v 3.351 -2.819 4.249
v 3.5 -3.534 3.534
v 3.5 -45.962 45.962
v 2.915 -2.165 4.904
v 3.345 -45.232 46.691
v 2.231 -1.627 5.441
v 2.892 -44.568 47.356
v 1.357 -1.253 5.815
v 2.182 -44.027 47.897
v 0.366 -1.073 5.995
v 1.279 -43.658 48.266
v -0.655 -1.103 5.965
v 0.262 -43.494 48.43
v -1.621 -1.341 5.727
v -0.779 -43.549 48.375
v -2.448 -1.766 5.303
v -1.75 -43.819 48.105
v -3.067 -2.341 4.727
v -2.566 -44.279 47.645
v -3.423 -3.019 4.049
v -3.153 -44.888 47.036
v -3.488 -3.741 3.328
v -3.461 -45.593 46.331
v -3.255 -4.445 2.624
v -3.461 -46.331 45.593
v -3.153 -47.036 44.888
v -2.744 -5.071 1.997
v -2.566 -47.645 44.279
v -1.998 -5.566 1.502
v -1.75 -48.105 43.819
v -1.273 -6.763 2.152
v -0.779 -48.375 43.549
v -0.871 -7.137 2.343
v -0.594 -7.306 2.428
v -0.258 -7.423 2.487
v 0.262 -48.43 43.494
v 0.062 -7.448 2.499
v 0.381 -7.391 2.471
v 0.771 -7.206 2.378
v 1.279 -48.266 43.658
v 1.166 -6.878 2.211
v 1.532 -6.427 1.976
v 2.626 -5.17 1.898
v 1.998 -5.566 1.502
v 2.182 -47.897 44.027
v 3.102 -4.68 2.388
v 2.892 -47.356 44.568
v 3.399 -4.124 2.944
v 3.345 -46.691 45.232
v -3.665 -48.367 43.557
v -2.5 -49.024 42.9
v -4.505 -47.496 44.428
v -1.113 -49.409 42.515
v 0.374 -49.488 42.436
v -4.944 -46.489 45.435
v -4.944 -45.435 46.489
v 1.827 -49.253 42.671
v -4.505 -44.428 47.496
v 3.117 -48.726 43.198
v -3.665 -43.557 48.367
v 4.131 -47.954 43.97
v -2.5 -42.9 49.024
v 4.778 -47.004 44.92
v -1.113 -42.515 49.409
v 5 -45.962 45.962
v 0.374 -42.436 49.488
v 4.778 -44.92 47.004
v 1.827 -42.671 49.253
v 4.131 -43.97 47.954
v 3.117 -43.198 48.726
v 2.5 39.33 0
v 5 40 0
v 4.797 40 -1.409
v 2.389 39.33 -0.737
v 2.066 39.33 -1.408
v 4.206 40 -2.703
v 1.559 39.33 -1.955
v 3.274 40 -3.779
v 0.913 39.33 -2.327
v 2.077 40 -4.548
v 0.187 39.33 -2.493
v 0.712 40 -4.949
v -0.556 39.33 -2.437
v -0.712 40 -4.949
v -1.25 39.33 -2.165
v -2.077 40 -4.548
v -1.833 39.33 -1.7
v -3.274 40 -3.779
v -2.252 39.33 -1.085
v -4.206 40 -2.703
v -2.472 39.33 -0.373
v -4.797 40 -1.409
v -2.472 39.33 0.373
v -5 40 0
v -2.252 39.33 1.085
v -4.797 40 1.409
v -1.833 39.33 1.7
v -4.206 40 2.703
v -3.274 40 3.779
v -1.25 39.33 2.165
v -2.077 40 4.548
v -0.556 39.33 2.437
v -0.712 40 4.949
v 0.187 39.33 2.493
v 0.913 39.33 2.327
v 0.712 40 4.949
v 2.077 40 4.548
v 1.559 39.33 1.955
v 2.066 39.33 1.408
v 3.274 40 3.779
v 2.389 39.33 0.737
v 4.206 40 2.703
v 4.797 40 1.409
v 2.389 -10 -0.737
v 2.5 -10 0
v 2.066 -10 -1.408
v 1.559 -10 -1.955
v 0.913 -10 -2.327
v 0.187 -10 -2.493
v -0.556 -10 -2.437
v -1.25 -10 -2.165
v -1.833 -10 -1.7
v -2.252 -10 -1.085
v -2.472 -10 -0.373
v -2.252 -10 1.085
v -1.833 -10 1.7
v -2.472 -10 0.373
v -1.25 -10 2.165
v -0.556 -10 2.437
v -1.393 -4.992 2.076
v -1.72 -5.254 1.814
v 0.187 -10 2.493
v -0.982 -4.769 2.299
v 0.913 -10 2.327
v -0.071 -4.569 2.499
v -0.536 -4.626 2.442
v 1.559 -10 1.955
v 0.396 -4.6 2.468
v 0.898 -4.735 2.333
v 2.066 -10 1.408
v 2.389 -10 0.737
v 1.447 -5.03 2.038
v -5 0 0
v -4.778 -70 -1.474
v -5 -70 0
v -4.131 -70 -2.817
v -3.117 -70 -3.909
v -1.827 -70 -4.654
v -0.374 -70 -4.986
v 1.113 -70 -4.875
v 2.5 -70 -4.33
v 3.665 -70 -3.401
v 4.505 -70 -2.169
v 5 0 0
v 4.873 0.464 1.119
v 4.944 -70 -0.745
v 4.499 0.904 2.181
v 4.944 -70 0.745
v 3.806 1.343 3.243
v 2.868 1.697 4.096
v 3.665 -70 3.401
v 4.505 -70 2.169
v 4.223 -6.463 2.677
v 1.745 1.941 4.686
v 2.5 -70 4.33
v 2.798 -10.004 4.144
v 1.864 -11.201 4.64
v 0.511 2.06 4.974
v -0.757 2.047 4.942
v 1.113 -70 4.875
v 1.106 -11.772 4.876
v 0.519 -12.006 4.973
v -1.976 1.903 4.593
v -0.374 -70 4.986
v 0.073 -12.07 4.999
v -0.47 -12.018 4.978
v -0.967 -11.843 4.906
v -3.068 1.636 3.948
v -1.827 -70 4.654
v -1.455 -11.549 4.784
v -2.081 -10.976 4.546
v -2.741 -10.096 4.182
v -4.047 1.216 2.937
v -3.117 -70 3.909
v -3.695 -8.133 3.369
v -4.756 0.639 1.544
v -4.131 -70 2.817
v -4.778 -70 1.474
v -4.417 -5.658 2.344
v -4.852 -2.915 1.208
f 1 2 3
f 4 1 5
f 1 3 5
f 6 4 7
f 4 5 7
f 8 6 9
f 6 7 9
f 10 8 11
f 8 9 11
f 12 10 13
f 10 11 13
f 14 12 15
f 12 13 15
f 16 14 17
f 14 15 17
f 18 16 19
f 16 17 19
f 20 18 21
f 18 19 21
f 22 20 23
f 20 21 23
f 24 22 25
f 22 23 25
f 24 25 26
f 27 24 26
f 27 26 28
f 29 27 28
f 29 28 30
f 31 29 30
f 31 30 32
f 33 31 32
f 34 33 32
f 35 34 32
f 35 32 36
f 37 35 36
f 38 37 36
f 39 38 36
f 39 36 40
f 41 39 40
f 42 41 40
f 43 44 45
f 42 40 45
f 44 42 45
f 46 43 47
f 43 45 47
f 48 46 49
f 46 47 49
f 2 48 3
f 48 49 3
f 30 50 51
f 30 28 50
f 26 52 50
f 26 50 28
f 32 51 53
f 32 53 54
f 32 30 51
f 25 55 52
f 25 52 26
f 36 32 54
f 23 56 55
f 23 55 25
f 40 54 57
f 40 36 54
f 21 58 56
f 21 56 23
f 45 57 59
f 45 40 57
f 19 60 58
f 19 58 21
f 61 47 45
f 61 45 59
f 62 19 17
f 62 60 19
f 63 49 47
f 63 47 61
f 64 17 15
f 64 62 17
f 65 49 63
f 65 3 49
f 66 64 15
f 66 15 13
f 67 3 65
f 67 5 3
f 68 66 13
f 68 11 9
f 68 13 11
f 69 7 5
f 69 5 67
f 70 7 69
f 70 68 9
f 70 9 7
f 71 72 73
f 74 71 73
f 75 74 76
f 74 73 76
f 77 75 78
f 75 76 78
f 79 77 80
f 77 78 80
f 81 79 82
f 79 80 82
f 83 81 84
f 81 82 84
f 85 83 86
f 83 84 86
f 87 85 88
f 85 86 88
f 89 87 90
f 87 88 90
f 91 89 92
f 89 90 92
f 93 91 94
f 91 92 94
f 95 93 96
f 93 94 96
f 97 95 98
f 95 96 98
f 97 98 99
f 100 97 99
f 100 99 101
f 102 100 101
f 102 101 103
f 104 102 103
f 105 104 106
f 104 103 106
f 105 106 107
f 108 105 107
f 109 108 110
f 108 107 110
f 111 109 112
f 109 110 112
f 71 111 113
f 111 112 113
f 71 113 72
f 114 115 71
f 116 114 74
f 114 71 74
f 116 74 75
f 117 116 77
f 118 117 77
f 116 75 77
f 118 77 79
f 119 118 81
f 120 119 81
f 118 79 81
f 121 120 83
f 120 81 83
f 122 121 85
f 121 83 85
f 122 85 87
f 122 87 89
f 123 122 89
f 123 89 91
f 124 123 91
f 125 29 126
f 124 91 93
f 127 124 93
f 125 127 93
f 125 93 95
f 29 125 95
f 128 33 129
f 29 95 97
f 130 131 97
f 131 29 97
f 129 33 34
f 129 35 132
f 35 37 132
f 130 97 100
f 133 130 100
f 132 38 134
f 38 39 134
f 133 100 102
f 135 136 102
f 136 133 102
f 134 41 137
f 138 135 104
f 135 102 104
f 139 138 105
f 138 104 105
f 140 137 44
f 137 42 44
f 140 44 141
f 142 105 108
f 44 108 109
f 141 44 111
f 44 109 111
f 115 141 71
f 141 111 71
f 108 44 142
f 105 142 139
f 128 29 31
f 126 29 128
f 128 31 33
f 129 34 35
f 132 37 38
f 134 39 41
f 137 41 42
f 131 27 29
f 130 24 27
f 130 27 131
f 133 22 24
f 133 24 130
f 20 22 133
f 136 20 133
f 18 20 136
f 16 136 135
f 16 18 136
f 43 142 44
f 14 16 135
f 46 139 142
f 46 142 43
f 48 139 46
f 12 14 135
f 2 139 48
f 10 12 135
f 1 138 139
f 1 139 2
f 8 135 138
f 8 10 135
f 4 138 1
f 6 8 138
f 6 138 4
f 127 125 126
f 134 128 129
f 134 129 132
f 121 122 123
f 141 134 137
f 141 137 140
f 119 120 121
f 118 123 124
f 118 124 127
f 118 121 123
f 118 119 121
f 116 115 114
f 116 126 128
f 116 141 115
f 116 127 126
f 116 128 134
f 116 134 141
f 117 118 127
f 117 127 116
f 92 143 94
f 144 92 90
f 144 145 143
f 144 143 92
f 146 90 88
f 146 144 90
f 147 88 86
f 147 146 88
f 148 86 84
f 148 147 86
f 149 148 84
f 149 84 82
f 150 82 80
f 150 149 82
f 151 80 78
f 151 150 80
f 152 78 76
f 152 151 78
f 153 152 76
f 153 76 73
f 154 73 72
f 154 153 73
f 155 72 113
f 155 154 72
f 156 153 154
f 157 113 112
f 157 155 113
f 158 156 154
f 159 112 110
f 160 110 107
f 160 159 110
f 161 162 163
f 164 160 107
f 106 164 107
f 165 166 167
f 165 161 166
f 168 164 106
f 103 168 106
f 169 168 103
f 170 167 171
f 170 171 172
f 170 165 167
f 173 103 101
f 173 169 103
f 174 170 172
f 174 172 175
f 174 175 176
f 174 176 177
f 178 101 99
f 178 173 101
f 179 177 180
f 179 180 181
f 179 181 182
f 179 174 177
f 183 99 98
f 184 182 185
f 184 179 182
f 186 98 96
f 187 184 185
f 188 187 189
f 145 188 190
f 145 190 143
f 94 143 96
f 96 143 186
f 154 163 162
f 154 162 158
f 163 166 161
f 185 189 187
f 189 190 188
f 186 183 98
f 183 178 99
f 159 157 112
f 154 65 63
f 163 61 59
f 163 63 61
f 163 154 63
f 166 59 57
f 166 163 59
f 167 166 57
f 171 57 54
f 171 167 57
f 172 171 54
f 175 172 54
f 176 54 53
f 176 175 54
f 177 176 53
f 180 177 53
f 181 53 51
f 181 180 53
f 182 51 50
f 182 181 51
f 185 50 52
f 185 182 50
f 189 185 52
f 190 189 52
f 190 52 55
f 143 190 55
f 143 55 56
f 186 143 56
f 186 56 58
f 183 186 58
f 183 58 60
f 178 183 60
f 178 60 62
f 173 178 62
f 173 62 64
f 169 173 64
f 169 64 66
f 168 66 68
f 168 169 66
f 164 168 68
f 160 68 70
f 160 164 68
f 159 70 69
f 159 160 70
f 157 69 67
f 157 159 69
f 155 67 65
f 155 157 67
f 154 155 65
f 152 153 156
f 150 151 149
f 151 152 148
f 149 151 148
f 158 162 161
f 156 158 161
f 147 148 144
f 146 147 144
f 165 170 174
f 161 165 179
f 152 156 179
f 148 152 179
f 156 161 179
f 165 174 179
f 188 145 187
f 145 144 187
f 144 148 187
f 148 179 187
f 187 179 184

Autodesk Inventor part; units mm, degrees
ref_plane "YZ Plane" through (0, 0, 0) normal (1, 0, 0) x (0, 1, 0)
ref_plane "XZ Plane" through (0, 0, 0) normal (0, 1, 0) x (-1, 0, 0)
ref_plane "XY Plane" through (0, 0, 0) normal (0, 0, 1) x (1, 0, 0)
ref_plane "Płaszczyzna konstrukcyjna9" through (0, 0, 0) normal (0, -0.7071068, 0.7071068) x (1, 0, 0)
sketch "Szkic5" plane through (0, 0, 0) normal (0, -0.7071068, 0.7071068) x (1, 0, 0)
  circle A0 centre (0, 0) radius 5
  dimension "d1" = 10
extrude "Wyciągnięcie proste1" add sketch "Szkic5" along normal blind 65
sketch "Szkic6" plane through (0, 0, 0) normal (0, 1, 0) x (-1, 0, 0)
  circle A0 centre (0, 0) radius 5
  dimension "d4" = 10
extrude "Wyciągnięcie proste2" add sketch "Szkic6" along normal mid plane 140
sketch "Szkic8" plane through (0, -45.9619, 45.9619) normal (0, -0.7071068, 0.7071068) x (1, 0, 0)
  circle A0 centre (0, 0) radius 5 projected
  circle A1 centre (0, 0) radius 3.5
  dimension "d8" = 7
extrude "Wyciągnięcie proste3" cut sketch "Szkic8" against normal blind 60 contours A1
sketch "Szkic9" plane through (0, 70, 0) normal (0, 1, 0) x (1, 0, 0)
  circle A0 centre (0, 0) radius 2.5
  dimension "d11" = 5
extrude "Wyciągnięcie proste4" cut sketch "Szkic9" against normal blind 80
sketch "Szkic10" plane through (0, 70, 0) normal (0, 1, 0) x (1, 0, 0)
  arc A0 (-5, 0) -> (5, 0) centre (0, 0) ccw projected
  circle A1 centre (0, 0) radius 5
  point P0 (5, 0)
  dimension "d14" = 10
extrude "Wyciągnięcie proste5" cut sketch "Szkic10" against normal blind 30
chamfer "Faza1" distance 2.5 angle 15 1 edges at (-2.5, 40, 0) measured on face at (-4.094, 40, 0.5983)
properties part number "rurka"
